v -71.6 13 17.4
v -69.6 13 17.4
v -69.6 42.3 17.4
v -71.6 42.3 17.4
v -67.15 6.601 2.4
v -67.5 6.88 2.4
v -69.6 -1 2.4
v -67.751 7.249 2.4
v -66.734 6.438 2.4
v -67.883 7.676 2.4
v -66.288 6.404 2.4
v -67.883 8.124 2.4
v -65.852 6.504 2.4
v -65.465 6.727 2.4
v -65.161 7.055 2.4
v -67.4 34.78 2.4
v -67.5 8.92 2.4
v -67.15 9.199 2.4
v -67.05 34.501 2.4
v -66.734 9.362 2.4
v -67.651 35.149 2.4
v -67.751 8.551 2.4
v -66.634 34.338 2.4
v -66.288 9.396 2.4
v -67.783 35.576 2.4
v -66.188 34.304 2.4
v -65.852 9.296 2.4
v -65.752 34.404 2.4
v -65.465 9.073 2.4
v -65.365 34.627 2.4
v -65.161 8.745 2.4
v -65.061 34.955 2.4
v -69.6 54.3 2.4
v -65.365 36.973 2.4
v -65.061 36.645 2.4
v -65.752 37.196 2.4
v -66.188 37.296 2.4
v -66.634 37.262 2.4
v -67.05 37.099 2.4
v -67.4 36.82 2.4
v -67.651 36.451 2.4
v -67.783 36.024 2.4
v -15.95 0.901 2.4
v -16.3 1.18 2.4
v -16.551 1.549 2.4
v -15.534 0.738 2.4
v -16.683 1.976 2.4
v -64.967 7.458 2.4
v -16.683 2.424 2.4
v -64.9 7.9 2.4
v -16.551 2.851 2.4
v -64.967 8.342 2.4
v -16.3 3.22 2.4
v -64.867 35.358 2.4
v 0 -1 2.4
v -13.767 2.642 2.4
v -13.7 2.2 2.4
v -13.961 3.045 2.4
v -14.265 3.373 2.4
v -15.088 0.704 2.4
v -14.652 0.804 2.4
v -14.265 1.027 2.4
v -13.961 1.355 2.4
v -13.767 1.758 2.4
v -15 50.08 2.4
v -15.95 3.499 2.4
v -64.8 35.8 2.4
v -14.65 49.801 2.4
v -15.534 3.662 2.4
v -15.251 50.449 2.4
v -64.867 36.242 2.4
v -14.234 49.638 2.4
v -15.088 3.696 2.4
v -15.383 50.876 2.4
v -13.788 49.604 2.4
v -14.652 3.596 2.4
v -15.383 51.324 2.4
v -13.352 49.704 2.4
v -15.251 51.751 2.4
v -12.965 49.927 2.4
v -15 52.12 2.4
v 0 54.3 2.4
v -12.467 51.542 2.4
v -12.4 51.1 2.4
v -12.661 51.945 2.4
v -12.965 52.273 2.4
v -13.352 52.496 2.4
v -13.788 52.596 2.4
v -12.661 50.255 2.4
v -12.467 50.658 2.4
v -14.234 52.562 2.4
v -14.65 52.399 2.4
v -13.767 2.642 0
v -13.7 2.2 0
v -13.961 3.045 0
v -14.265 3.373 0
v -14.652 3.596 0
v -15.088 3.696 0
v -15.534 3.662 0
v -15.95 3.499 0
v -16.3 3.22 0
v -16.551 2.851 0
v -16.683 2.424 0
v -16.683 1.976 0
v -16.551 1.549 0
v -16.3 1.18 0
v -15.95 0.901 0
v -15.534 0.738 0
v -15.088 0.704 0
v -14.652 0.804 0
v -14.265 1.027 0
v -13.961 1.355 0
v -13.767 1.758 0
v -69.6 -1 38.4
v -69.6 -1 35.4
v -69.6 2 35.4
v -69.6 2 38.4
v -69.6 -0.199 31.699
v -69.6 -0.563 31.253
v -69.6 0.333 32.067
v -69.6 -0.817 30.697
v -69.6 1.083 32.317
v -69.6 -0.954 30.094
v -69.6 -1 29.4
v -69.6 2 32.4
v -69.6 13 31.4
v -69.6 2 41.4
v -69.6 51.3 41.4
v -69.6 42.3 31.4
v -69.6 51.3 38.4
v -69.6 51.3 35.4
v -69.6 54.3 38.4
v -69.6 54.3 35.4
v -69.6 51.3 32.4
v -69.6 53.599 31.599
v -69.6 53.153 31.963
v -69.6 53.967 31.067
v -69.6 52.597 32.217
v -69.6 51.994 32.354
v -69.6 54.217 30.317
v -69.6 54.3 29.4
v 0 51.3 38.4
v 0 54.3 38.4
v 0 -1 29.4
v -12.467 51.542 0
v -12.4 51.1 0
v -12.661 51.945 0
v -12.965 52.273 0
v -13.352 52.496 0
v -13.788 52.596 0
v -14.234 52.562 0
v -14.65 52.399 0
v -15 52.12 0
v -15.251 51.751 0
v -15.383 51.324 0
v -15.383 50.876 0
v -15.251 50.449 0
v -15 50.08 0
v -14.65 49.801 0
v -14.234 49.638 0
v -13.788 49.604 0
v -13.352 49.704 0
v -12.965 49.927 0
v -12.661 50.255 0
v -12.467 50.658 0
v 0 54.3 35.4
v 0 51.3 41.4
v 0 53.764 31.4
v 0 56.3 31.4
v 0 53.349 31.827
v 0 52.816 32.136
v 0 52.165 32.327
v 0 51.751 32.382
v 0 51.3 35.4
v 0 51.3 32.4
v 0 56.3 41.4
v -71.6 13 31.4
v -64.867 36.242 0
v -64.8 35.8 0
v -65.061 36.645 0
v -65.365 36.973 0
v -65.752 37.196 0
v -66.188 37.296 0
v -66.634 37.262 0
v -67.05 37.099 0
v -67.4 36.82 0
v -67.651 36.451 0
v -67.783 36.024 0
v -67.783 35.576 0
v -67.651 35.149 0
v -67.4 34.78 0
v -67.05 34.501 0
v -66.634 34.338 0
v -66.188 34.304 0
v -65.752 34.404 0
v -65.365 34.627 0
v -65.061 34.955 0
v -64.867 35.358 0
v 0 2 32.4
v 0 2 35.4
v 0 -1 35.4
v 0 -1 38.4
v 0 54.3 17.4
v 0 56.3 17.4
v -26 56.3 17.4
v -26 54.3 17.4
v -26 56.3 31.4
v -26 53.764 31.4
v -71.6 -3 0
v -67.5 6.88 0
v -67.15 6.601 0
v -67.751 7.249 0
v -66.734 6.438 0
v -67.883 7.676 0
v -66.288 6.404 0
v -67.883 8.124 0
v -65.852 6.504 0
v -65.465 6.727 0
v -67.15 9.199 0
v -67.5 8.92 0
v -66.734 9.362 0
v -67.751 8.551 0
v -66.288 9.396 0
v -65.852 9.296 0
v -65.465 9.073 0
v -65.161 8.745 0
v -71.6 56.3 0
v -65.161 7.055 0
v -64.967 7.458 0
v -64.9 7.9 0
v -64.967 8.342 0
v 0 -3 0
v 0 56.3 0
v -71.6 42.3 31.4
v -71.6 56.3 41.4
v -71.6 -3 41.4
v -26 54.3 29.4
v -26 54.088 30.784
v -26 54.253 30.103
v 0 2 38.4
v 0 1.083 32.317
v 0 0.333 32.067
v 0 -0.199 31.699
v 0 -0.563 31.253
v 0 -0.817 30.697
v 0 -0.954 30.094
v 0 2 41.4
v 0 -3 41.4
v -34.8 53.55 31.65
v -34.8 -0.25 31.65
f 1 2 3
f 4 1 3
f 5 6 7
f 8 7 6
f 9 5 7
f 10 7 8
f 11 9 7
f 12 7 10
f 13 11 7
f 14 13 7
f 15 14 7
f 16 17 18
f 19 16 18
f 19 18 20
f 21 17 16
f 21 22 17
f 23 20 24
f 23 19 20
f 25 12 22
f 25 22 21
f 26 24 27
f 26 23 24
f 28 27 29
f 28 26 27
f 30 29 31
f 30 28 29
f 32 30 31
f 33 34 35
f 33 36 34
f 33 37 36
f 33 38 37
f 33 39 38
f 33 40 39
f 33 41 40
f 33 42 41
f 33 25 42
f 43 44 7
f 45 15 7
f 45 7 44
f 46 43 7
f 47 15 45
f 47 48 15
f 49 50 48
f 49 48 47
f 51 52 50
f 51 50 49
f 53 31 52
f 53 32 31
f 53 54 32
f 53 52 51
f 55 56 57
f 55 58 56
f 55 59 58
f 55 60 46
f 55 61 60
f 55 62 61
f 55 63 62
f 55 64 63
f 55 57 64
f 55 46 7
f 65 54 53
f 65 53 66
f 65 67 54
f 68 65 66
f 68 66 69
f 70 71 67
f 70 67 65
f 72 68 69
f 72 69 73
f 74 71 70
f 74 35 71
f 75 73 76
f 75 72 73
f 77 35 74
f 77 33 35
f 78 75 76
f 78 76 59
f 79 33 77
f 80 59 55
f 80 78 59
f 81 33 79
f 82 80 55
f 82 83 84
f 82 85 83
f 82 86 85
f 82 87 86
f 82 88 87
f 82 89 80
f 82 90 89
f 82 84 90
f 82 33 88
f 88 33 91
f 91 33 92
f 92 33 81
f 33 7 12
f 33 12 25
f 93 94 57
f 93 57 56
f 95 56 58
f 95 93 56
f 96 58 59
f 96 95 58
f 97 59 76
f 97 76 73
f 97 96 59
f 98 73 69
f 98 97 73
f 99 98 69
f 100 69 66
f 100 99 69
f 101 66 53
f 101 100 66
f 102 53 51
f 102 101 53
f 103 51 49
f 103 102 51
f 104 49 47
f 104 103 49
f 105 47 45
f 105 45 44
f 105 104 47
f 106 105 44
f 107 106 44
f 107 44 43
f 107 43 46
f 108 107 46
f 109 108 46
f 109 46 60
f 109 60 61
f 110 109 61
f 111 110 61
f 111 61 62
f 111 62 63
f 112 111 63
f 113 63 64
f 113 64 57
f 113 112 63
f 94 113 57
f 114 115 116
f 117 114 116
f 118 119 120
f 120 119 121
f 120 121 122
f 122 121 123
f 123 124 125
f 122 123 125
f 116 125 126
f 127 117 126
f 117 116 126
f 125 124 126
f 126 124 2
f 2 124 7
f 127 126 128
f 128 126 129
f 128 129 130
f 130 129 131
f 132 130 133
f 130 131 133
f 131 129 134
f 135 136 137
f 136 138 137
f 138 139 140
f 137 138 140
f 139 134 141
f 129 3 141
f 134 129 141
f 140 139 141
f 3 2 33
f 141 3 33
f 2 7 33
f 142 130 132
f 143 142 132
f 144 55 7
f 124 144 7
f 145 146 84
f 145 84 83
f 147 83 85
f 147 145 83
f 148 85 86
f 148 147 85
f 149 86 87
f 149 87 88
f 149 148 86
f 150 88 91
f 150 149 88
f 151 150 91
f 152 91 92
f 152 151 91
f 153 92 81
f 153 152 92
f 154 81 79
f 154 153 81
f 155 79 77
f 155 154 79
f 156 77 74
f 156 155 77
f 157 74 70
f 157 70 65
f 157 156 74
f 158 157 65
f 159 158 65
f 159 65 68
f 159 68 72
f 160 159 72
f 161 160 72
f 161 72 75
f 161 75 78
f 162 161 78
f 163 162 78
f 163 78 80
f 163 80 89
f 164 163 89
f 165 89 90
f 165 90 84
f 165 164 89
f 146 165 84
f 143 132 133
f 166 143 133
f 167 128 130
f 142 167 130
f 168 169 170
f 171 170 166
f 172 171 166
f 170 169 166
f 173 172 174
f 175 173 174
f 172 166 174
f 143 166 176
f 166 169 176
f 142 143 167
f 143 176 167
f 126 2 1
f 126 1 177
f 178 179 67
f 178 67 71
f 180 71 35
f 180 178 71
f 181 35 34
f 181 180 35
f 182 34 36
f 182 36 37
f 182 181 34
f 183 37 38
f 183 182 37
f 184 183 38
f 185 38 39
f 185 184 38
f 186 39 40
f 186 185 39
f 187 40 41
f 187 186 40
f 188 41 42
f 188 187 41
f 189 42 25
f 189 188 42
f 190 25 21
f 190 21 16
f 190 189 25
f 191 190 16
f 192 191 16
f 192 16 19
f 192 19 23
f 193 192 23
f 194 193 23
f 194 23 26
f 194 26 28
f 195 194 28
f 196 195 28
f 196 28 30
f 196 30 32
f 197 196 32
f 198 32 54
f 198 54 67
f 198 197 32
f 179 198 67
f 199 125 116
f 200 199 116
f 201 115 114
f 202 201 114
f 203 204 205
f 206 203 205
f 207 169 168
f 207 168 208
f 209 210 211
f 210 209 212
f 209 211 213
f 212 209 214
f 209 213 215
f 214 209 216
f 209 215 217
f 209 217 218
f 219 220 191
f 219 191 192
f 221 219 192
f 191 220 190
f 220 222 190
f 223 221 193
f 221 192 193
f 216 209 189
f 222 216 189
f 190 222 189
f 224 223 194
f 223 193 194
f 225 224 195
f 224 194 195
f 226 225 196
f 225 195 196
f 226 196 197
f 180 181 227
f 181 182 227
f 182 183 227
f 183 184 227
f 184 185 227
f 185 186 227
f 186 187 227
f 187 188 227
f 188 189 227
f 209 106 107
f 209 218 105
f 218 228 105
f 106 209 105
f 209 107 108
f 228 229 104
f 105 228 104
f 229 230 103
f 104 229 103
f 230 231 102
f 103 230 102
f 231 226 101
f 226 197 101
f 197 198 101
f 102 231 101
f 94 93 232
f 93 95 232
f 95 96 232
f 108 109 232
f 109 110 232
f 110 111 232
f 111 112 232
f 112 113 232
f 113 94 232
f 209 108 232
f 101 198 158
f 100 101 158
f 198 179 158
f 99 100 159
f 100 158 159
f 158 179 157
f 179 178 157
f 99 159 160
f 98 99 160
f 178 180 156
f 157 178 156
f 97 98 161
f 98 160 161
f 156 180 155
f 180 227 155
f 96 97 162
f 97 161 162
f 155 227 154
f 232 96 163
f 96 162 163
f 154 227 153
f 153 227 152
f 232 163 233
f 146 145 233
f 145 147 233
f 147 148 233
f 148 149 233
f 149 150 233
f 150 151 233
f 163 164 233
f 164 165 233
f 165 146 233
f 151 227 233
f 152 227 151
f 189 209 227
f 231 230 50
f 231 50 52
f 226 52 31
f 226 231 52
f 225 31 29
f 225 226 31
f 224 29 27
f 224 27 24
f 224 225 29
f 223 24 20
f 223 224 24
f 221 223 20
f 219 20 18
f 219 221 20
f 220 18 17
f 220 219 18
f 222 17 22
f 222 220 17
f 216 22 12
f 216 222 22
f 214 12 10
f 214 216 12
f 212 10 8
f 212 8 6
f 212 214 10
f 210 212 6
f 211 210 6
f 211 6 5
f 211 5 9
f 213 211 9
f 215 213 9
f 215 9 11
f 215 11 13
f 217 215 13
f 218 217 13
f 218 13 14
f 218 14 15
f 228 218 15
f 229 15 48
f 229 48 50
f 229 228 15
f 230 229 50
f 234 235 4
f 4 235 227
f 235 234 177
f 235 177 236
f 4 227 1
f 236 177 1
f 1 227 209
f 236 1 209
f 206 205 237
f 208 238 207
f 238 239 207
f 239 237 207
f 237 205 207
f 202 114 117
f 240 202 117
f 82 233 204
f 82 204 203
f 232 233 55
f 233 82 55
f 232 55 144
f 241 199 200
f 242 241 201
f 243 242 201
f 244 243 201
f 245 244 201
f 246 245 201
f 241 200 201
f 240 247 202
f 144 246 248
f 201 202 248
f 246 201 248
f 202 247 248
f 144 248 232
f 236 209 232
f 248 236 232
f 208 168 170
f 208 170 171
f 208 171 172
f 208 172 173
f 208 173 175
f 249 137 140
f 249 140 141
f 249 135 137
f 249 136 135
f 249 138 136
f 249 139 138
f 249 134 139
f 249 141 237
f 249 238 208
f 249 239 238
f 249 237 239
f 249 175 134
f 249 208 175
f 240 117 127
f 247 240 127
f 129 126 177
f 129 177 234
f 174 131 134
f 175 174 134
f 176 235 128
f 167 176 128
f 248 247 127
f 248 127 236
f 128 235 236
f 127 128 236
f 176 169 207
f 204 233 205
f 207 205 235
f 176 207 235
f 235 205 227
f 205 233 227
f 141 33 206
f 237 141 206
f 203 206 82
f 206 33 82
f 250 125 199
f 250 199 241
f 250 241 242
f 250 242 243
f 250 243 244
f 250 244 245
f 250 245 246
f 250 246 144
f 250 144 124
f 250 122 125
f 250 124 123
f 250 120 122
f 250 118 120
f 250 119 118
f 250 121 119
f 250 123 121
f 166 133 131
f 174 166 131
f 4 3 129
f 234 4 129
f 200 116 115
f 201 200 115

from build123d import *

# Parameters (mm, degrees)
F1_W        = 68.6
F1_H        = 53.3
F1_R        = 1.5
F2_DEPTH    = 2.4
F4_DEPTH    = 39
F6_DEPTH    = 69.6
F7_T1_DEPTH = 69.6
F8_W        = 29.3
F8_H        = 14
F9_DEPTH    = 25.4
F10_W       = 26
F10_H       = 14
F11_DEPTH   = 25.4


# Not quite as in the source:
# - a fillet or chamfer that OpenCascade refuses, or shapes differently, is made with other operations: its cross-section is extruded or revolved along the edge and cut away or added


with BuildPart() as f2:
    # F1 (on Top) → F2 (new body)
    with BuildSketch(Plane.XY):
        Polygon((-68.6, 0), (-68.6, 53.3), (0, 53.3), (0, 56.3), (-71.6, 56.3), (-71.6, -3), (0, -3), (0, 0), align=None)
        with Locations((-34.3, 26.65)):
            Rectangle(F1_W, F1_H)
        with Locations((-66.4, 7.9)):
            Circle(F1_R, mode=Mode.SUBTRACT)
        with Locations((-15.2, 2.2)):
            Circle(F1_R, mode=Mode.SUBTRACT)
        with Locations((-66.3, 35.8)):
            Circle(F1_R, mode=Mode.SUBTRACT)
        with Locations((-13.9, 51.1)):
            Circle(F1_R, mode=Mode.SUBTRACT)
    extrude(amount=F2_DEPTH)

    # F3 (on face) → F4 (join)
    with BuildSketch(Plane.XY.offset(2.4)):
        Polygon((0, 54.3), (0, 56.3), (-71.6, 56.3), (-71.6, -3), (0, -3), (0, -1), (-69.6, -1), (-69.6, 54.3), align=None)
    extrude(amount=F4_DEPTH)

    # F5 (on face) → F6 (join, through all)
    with BuildSketch(Plane.YZ.offset(-69.6)):
        Polygon((2, 41.4), (-1, 41.4), (-2.3718131706, 41.4), (-2.3718131706, 32.4), (-1, 32.4), (2, 32.4), (2, 35.4), (-1, 35.4), (-1, 38.4), (2, 38.4), align=None)
        Polygon((55.6718131706, 32.4), (55.6718131706, 41.4), (54.3, 41.4), (51.3, 41.4), (51.3, 38.4), (54.3, 38.4), (54.3, 35.4), (51.3, 35.4), (51.3, 32.4), (54.3, 32.4), align=None)
    extrude(amount=F6_DEPTH)

    # F7: fillet of radius 3 on 2 edges, made by hand

    # F7_s2 → F7_t1 (join)
    with BuildSketch(Plane.YZ.offset(-69.6)):
        with BuildLine():
            add(Edge.make_bspline(
                [(2, 32.4), (-1, 32.4), (-1, 29.4)],
                knots=[0, 0, 0, 1, 1, 1], degree=2, weights=[1, 1, 1]))
            Line((-1, 29.4), (-1, 32.4))
            Line((-1, 32.4), (2, 32.4))
        make_face()
        with BuildLine():
            add(Edge.make_bspline(
                [(54.3, 29.4), (54.3, 32.4), (51.3, 32.4)],
                knots=[0, 0, 0, 1, 1, 1], degree=2, weights=[1, 1, 1]))
            Line((51.3, 32.4), (54.3, 32.4))
            Line((54.3, 32.4), (54.3, 29.4))
        make_face()
    extrude(amount=F7_T1_DEPTH)

    # F8 (on face) → F9 (cut)
    with BuildSketch(Plane.YZ.offset(-69.6)):
        with Locations((27.65, 24.4)):
            Rectangle(F8_W, F8_H)
    extrude(amount=-F9_DEPTH, mode=Mode.SUBTRACT)

    # F10 (on face) → F11 (cut)
    with BuildSketch(Plane(origin=(0, 56.3, 0), x_dir=(-1, 0, 0), z_dir=(0, 1, 0))):
        with Locations((13, 24.4)):
            Rectangle(F10_W, F10_H)
    extrude(amount=-F11_DEPTH, mode=Mode.SUBTRACT)


solid = f2.part
